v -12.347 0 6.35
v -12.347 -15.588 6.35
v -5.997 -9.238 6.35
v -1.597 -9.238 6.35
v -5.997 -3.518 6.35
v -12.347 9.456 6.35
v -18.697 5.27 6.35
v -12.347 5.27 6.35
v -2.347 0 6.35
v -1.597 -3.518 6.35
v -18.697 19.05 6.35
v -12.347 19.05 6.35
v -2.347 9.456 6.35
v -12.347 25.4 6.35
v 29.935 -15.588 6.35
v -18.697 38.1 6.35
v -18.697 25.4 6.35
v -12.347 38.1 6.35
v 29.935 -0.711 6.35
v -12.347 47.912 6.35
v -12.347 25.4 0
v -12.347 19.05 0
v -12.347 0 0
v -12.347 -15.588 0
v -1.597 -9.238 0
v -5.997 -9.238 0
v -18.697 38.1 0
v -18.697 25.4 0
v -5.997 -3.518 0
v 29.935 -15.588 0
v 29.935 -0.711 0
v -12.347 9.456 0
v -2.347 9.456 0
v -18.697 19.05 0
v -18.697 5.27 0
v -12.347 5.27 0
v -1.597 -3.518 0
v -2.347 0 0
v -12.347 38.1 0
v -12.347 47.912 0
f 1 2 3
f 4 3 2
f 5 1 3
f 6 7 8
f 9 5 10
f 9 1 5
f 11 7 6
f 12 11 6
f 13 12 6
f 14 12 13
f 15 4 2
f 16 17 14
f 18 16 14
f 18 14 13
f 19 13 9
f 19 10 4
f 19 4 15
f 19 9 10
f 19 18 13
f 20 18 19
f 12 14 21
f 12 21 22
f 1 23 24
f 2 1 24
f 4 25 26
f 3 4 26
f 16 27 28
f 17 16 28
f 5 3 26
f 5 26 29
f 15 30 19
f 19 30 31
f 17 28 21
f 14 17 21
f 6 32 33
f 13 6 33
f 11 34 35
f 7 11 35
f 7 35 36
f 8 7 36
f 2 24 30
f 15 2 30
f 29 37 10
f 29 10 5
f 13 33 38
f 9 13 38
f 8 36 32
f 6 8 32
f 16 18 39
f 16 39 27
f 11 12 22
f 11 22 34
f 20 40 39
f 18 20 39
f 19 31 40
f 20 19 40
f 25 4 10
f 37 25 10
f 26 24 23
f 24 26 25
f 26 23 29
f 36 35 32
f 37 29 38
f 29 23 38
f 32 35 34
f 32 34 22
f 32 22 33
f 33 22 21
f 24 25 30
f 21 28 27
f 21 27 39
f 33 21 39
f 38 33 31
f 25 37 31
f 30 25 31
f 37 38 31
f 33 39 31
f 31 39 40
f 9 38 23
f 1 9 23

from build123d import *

# Parameters (mm, degrees)
BOSS_EXTRUDE1_DEPTH = 6.35
SKETCH2_W           = 4.4
SKETCH2_H           = 5.72
CUT_EXTRUDE1_DEPTH  = 57.85115788


with BuildPart() as part:
    # Sketch1 → Boss-Extrude1 (new body)
    with BuildSketch(Plane.XY):
        Polygon((-12.346676125, 38.1), (-18.696676125, 38.1), (-18.696676125, 25.4), (-12.346676125, 25.4), (-12.346676125, 19.05), (-18.696676125, 19.05), (-18.696676125, 5.2705), (-12.346676125, 5.2705), (-12.346676125, 9.455763351), (-2.346676125, 9.455763351), (-2.346676125, 5.2705), (-2.346676125, 0), (-12.346676125, 0), (-12.346676125, -15.5875), (29.935330231, -15.5875), (29.935330231, -0.710514446), (-12.346676125, 47.9125), align=None)
    extrude(amount=BOSS_EXTRUDE1_DEPTH)

    # Sketch2 → Cut-Extrude1 (cut, through all)
    with BuildSketch(Plane(origin=(0, 0, 0), x_dir=(-1, 0, 0), z_dir=(0, 0, -1))):
        with Locations((3.796676125, -6.3775)):
            Rectangle(SKETCH2_W, SKETCH2_H)
    extrude(amount=-CUT_EXTRUDE1_DEPTH, mode=Mode.SUBTRACT)


solid = part.part
